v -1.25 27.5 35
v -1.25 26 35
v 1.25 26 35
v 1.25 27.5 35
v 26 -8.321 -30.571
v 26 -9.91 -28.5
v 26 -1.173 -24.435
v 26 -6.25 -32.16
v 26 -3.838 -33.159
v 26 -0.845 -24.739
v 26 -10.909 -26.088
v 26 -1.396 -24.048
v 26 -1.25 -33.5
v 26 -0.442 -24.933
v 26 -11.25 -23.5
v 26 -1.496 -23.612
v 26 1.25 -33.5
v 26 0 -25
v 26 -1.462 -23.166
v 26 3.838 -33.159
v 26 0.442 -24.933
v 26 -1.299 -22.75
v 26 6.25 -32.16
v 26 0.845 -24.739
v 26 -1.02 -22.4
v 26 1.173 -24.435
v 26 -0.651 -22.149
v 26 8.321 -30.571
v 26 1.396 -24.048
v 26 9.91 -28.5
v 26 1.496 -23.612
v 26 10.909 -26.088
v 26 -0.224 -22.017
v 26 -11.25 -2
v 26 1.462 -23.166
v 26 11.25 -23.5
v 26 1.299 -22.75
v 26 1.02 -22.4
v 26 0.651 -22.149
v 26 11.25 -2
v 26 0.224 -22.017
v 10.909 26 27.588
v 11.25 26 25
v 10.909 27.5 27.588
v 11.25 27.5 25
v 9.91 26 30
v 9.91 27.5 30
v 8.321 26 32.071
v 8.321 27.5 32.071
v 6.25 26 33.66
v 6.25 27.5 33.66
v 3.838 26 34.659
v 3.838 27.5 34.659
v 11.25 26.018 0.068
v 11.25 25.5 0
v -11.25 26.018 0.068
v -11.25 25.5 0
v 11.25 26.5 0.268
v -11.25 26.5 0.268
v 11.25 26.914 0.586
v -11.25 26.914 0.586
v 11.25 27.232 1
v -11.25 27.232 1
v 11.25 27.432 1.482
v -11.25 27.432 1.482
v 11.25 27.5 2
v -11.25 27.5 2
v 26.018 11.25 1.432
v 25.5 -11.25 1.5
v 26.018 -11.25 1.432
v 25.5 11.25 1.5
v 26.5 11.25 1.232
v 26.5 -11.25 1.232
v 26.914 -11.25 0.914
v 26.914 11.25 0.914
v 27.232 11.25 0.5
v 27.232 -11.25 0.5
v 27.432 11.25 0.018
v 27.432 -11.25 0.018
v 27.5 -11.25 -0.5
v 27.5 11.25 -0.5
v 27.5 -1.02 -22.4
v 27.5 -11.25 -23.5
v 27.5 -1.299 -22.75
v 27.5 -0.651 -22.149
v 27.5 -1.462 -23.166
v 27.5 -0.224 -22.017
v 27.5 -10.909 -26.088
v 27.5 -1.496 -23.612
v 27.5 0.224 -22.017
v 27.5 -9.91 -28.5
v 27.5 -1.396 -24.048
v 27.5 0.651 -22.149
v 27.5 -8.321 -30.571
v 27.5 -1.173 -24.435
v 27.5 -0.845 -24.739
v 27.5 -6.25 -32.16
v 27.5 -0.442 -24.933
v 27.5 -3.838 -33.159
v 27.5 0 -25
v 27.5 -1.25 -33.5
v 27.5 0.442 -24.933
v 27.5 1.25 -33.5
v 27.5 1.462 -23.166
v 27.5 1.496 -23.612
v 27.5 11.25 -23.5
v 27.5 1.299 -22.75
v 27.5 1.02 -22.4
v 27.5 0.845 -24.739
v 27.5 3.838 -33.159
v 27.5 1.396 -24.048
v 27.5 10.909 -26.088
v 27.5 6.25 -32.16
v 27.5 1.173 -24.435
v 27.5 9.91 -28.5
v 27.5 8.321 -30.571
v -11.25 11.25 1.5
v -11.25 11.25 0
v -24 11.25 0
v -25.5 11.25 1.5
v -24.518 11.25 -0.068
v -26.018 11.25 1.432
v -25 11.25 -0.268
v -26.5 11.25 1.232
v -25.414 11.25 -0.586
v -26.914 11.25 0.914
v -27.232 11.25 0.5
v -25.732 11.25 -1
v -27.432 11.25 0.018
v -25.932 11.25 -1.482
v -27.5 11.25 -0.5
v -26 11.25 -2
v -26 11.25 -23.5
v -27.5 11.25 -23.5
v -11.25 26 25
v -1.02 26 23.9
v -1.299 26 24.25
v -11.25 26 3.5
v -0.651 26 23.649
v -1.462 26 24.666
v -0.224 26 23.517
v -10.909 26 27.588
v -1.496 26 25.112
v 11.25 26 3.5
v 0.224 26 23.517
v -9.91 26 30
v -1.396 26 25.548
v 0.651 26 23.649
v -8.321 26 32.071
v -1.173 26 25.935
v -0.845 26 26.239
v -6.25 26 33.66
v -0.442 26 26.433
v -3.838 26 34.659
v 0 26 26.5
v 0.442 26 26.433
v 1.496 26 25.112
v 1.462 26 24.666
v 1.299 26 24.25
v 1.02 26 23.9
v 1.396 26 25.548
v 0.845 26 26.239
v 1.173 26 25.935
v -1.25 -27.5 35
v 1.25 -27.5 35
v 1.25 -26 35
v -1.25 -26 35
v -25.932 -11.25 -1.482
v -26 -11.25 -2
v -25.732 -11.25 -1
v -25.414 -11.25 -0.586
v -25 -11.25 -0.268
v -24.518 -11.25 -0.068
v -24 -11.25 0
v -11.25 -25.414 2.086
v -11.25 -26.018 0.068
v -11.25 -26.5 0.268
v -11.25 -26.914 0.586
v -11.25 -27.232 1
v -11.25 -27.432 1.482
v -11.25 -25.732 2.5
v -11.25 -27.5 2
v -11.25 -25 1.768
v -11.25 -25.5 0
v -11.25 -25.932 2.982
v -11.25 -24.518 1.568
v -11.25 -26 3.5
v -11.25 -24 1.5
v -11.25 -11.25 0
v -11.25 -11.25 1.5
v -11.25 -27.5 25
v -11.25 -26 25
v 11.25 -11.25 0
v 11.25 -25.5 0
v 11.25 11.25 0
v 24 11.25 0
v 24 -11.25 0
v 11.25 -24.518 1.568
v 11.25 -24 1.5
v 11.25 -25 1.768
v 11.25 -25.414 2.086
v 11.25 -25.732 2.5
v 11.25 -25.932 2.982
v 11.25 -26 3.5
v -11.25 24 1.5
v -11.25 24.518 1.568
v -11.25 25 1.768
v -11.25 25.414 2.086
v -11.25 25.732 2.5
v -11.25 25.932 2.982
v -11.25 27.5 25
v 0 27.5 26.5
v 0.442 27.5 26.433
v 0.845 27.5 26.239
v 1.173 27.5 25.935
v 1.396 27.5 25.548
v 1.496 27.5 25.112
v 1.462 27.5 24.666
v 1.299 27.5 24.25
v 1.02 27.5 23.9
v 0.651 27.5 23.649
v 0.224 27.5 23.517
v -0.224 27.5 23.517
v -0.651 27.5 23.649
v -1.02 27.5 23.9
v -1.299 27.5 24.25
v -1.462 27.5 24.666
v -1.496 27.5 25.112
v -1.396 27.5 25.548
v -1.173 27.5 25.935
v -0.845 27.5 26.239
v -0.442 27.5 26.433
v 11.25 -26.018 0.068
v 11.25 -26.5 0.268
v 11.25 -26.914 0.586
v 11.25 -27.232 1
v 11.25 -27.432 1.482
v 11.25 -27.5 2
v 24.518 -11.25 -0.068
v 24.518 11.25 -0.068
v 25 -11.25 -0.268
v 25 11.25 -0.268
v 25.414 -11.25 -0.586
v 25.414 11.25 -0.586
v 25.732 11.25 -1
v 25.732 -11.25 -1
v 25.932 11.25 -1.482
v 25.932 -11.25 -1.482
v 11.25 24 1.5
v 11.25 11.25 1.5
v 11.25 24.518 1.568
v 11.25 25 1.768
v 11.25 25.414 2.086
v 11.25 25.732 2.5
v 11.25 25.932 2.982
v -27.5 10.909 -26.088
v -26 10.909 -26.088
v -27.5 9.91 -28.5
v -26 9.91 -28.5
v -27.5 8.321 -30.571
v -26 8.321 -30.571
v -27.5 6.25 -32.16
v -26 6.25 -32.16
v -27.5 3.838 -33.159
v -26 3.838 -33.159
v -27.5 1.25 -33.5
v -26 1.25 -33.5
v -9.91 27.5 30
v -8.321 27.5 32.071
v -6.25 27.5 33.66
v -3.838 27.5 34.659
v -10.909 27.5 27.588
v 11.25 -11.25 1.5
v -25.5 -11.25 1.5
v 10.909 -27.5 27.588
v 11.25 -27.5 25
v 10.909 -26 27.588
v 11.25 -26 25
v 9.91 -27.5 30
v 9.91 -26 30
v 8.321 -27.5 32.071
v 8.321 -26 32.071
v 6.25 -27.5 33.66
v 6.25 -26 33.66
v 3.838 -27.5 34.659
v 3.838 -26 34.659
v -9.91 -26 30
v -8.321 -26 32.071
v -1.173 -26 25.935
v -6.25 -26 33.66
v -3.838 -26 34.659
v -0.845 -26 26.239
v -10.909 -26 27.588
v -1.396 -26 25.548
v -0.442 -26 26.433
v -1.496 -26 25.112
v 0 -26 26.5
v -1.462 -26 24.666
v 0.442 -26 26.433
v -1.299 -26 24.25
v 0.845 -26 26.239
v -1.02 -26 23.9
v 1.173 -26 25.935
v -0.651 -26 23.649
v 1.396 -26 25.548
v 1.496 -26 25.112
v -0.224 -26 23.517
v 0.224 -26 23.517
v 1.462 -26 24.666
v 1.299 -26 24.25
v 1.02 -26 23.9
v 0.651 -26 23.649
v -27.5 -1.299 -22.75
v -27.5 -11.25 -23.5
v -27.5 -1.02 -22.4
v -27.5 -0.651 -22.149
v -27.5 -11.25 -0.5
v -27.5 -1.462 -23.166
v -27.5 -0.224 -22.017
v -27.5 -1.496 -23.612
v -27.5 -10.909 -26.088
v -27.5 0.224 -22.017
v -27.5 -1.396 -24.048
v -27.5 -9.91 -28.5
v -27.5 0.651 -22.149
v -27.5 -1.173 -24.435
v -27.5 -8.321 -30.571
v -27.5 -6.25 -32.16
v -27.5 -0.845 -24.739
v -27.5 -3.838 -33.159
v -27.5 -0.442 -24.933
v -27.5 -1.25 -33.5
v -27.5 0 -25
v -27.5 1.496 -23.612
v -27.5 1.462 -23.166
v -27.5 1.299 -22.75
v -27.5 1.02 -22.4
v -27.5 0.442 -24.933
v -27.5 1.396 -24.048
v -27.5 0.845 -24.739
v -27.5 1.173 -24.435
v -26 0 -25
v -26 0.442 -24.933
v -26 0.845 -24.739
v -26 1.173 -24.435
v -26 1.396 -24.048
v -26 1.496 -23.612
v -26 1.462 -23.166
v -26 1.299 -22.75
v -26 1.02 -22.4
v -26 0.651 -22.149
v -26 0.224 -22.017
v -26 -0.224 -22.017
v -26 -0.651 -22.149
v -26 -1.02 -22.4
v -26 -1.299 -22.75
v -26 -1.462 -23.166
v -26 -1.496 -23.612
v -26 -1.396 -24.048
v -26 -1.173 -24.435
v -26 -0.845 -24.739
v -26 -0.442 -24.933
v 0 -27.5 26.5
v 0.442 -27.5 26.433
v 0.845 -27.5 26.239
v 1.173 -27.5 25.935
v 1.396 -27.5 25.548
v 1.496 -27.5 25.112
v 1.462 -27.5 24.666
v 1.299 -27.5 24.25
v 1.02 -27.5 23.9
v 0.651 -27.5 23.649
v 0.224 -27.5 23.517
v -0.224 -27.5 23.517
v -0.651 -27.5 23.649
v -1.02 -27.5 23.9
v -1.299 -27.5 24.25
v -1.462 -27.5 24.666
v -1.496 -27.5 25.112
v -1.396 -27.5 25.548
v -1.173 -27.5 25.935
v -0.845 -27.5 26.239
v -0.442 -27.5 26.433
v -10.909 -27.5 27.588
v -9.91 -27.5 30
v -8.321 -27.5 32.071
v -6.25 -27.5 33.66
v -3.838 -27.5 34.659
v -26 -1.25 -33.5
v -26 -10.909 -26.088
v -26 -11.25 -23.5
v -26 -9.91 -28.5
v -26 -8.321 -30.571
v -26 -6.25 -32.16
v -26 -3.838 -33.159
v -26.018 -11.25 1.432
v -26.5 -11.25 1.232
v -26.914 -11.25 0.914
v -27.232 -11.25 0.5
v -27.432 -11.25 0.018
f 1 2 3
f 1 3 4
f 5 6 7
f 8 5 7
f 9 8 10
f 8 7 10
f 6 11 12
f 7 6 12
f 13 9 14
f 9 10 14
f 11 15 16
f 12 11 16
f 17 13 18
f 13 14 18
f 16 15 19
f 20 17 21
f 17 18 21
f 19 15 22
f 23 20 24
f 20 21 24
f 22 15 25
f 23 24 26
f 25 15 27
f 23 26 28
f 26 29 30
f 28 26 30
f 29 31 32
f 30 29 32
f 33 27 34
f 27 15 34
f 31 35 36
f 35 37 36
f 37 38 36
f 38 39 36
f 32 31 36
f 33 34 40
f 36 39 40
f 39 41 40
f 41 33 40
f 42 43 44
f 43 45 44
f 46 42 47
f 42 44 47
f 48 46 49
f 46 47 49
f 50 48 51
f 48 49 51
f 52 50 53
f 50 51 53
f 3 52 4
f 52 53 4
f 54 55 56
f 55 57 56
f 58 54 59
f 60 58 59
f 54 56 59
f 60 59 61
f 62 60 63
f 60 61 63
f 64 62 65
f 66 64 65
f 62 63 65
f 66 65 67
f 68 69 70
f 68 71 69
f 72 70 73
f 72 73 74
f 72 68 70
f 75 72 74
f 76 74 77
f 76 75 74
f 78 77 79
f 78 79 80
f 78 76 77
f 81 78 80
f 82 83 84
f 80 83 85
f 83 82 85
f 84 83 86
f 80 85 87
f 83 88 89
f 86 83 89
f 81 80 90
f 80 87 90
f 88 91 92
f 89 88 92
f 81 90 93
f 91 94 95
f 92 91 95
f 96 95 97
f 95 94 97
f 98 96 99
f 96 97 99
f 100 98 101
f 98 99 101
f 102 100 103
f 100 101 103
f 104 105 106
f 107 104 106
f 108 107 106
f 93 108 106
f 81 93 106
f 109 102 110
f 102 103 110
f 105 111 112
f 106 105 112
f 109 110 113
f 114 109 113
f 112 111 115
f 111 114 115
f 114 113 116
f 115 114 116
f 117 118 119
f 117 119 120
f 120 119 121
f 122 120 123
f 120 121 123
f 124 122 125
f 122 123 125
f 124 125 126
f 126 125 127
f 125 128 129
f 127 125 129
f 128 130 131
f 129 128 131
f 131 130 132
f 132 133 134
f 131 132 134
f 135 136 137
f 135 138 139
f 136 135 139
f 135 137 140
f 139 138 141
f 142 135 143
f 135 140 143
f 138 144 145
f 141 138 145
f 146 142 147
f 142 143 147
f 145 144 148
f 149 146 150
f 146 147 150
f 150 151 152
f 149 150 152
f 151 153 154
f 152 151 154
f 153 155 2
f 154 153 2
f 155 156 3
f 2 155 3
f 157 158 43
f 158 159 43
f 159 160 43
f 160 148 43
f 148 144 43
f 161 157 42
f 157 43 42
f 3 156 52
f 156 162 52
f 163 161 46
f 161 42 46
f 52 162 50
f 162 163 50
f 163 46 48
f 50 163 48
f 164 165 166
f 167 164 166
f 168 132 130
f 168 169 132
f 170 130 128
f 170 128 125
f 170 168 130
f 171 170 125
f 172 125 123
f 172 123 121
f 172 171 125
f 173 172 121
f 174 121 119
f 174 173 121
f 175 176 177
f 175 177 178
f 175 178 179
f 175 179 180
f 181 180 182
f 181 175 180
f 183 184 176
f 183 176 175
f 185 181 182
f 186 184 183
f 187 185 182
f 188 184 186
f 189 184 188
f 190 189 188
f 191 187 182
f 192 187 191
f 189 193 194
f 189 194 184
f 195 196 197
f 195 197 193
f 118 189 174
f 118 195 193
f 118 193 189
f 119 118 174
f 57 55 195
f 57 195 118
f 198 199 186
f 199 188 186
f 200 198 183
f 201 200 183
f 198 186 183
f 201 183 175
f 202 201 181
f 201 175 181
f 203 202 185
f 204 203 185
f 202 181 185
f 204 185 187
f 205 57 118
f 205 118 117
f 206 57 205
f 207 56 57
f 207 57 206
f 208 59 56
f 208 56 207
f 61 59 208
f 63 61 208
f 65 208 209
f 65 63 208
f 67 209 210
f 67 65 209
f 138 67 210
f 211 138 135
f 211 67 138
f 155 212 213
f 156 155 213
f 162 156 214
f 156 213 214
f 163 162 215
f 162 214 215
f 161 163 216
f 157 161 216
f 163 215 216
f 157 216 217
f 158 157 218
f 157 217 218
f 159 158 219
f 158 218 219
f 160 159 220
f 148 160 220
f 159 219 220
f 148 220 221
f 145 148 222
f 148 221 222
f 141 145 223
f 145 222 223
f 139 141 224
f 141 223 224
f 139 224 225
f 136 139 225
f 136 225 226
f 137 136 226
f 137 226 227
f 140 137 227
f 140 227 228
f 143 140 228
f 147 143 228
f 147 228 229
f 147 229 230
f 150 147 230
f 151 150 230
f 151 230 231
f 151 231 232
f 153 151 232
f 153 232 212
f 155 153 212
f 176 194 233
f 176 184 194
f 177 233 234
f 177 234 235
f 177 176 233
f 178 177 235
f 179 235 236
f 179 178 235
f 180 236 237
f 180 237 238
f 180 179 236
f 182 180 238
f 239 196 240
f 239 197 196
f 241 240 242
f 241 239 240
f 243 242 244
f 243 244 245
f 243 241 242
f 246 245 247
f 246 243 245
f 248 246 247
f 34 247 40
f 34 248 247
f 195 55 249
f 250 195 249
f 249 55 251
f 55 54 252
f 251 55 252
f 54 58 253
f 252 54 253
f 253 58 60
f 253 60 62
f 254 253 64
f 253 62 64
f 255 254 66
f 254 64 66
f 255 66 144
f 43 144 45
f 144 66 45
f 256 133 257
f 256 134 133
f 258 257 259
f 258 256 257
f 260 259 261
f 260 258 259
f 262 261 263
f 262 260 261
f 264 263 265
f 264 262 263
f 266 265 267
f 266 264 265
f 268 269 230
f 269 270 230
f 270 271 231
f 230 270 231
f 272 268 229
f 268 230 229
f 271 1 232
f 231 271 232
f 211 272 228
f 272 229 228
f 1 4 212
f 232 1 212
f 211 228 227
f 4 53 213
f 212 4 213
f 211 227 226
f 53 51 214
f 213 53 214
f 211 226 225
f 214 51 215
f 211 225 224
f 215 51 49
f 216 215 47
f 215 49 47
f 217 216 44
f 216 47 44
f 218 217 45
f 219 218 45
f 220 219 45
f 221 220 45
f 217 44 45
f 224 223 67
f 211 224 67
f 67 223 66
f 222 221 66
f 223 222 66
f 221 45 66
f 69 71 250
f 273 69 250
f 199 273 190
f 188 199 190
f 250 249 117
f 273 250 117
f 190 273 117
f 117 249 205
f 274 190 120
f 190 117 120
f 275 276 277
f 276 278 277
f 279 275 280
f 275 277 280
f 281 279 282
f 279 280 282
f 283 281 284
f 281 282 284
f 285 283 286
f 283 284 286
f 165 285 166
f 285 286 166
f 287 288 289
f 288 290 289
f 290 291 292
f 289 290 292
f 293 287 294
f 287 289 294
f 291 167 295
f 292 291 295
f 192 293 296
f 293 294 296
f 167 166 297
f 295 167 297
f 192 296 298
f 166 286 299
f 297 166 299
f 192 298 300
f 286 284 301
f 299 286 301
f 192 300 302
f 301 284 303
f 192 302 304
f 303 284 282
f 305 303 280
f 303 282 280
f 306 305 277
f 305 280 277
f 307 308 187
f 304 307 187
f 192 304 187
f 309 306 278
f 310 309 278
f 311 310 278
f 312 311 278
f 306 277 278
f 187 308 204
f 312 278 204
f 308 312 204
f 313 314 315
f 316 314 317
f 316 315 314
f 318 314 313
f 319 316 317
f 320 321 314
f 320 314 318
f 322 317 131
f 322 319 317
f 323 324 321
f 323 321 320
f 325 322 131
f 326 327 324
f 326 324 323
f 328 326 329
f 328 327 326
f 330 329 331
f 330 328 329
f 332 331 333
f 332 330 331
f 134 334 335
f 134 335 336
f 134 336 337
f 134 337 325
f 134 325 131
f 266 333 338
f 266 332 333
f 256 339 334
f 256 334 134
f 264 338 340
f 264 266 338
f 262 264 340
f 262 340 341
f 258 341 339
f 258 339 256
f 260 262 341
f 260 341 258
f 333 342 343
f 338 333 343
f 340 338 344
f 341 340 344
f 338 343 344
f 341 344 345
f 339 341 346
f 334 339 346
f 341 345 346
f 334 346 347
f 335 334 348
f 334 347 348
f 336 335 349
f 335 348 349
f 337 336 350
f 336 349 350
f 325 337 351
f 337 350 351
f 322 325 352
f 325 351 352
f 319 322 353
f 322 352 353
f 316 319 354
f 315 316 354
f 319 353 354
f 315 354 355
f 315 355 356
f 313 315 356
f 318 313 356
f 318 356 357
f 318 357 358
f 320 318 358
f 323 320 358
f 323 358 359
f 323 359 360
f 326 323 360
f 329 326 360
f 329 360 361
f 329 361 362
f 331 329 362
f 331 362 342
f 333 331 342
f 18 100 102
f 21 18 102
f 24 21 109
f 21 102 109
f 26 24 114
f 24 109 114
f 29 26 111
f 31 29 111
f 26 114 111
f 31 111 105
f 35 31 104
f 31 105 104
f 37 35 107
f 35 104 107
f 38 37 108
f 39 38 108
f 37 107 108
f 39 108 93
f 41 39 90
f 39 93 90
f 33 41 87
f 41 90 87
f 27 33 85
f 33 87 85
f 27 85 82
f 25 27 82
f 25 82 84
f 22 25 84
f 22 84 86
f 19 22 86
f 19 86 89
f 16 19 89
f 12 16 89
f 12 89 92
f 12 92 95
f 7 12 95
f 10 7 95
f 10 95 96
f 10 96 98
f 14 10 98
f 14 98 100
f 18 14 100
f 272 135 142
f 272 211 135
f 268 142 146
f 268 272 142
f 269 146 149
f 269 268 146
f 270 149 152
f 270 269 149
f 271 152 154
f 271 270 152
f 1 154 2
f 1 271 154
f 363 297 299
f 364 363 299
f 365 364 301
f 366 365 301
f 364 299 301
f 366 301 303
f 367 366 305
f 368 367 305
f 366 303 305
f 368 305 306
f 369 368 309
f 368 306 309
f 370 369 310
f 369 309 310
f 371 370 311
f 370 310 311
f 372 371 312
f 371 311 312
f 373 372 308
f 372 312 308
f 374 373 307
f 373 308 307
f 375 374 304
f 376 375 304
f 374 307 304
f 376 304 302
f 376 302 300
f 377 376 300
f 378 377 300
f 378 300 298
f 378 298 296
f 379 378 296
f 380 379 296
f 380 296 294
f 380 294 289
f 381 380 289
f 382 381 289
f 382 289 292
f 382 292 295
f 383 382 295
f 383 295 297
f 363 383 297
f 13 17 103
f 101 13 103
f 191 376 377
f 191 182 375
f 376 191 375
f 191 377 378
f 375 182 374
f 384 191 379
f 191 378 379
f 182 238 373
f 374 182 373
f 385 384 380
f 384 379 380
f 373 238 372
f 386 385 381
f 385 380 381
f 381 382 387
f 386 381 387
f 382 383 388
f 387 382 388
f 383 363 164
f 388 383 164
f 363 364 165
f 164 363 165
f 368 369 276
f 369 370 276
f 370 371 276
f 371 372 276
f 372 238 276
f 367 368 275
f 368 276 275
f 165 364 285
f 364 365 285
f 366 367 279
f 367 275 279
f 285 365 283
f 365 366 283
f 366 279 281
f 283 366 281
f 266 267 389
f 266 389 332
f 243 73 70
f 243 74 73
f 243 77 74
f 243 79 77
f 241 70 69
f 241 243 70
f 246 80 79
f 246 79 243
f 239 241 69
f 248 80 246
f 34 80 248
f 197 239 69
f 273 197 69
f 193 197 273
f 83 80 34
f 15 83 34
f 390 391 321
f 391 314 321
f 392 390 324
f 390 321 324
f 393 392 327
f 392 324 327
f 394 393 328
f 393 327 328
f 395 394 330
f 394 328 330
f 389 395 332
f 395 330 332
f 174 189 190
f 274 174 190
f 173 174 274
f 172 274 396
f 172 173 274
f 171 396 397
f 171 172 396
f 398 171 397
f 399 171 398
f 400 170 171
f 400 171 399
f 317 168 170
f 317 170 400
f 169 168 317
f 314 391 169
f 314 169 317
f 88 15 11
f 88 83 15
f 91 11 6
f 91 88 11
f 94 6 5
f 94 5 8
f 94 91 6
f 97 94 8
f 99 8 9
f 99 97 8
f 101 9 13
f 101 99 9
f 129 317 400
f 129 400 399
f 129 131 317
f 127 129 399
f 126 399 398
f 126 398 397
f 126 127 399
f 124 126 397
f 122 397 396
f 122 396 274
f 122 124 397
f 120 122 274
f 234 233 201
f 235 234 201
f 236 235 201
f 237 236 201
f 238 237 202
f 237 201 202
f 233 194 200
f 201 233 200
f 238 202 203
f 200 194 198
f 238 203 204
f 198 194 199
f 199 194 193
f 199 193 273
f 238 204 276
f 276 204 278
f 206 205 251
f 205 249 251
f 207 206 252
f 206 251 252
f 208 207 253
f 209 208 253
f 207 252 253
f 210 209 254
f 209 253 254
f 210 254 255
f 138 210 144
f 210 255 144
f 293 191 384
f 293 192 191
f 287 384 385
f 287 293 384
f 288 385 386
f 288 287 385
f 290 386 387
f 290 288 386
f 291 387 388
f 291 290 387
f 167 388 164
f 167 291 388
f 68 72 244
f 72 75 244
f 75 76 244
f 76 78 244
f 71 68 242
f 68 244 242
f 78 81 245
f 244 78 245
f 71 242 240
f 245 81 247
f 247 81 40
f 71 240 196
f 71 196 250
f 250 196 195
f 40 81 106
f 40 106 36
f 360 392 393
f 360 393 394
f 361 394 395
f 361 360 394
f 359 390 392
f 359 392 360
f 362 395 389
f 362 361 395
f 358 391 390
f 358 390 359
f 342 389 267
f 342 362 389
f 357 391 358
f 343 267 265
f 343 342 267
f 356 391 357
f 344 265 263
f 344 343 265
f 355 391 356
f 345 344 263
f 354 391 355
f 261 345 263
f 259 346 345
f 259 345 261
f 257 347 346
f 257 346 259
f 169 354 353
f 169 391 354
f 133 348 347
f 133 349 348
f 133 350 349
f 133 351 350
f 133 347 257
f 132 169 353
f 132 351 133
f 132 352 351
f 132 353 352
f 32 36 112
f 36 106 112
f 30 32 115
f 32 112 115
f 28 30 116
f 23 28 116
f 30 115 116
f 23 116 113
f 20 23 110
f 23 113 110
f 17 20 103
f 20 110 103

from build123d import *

# Parameters (mm, degrees)
EXTRUDE_1_DEPTH     = 11.25
SKETCH_2_R          = 1.5
CUT_EXTRUDE_1_DEPTH = 67.155593112
SKETCH_3_W          = 55
SKETCH_3_H          = 22.5
EXTRUDE_1_2_DEPTH   = 1.5
SKETCH_4_W          = 1.5
SKETCH_4_H          = 22.5
EXTRUDE_2_DEPTH     = 35
SKETCH_5_R          = 1.5
CUT_EXTRUDE_2_DEPTH = 71.75485849
FILLET_1_R          = 10
FILLET_2_R          = 2


with BuildPart() as part:
    # 草图1 → Extrude 1 (new, symmetric)
    with BuildSketch(Plane(origin=(0, 0, 0), x_dir=(0, 0, -1), z_dir=(1, 0, 0))):
        Polygon((-35, 27.5), (0, 27.5), (0, -27.5), (-35, -27.5), (-35, -26), (-1.5, -26), (-1.5, 26), (-35, 26), align=None)
    extrude(amount=EXTRUDE_1_DEPTH, both=True)

    # 草图2 → 切除-拉伸1 (cut, through all)
    with BuildSketch(Plane(origin=(0, 27.5, 0), x_dir=(1, 0, 0), z_dir=(0, 1, 0))):
        with Locations(Location((0, -25, 0), (0, 0, 270))):
            Circle(SKETCH_2_R)
    extrude(amount=-CUT_EXTRUDE_1_DEPTH, mode=Mode.SUBTRACT)

    # 草图3 → Extrude 1 2 (add)
    with BuildSketch(Plane(origin=(0, 0, 0), x_dir=(-1, 0, 0), z_dir=(0, 0, -1))):
        Rectangle(SKETCH_3_W, SKETCH_3_H)
    extrude(amount=-EXTRUDE_1_2_DEPTH)

    # 草图4 → 凸台-拉伸2 (add)
    with BuildSketch(Plane.XY.offset(1.5)):
        with Locations((26.75, 0)):
            Rectangle(SKETCH_4_W, SKETCH_4_H)
    extrude_2 = extrude(amount=-EXTRUDE_2_DEPTH)

    # 镜向1: 凸台-拉伸2 across plane
    add(extrude_2.mirror(Plane(origin=(0, 0, 0), x_dir=(0, 0, 1), z_dir=(1, 0, 0))))

    # 草图5 → 切除-拉伸2 (cut, through all)
    with BuildSketch(Plane(origin=(27.5, 0, 0), x_dir=(0, 0, -1), z_dir=(1, 0, 0))):
        with Locations((23.5, 0)):
            Circle(SKETCH_5_R)
    extrude(amount=-CUT_EXTRUDE_2_DEPTH, mode=Mode.SUBTRACT)

    # 圆角1
    fillet_1_edges = [part.edges().sort_by_distance(p)[0] for p in [
        (11.25, 26.75, 35),
        (11.25, -26.75, 35),
        (-11.25, 26.75, 35),
        (26.75, 11.25, -33.5),
        (26.75, -11.25, -33.5),
        (-11.25, -26.75, 35),
        (-26.75, -11.25, -33.5),
        (-26.75, 11.25, -33.5),
    ]]
    fillet(fillet_1_edges, radius=FILLET_1_R)

    # 圆角2
    fillet_2_edges = [part.edges().sort_by_distance(p)[0] for p in [
        (0, -26, 1.5),
        (0, 26, 1.5),
        (0, 27.5, 0),
        (0, -27.5, 0),
        (27.5, 0, 1.5),
        (-27.5, 0, 1.5),
        (26, 0, 0),
        (-26, 0, 0),
    ]]
    fillet(fillet_2_edges, radius=FILLET_2_R)


solid = part.part
